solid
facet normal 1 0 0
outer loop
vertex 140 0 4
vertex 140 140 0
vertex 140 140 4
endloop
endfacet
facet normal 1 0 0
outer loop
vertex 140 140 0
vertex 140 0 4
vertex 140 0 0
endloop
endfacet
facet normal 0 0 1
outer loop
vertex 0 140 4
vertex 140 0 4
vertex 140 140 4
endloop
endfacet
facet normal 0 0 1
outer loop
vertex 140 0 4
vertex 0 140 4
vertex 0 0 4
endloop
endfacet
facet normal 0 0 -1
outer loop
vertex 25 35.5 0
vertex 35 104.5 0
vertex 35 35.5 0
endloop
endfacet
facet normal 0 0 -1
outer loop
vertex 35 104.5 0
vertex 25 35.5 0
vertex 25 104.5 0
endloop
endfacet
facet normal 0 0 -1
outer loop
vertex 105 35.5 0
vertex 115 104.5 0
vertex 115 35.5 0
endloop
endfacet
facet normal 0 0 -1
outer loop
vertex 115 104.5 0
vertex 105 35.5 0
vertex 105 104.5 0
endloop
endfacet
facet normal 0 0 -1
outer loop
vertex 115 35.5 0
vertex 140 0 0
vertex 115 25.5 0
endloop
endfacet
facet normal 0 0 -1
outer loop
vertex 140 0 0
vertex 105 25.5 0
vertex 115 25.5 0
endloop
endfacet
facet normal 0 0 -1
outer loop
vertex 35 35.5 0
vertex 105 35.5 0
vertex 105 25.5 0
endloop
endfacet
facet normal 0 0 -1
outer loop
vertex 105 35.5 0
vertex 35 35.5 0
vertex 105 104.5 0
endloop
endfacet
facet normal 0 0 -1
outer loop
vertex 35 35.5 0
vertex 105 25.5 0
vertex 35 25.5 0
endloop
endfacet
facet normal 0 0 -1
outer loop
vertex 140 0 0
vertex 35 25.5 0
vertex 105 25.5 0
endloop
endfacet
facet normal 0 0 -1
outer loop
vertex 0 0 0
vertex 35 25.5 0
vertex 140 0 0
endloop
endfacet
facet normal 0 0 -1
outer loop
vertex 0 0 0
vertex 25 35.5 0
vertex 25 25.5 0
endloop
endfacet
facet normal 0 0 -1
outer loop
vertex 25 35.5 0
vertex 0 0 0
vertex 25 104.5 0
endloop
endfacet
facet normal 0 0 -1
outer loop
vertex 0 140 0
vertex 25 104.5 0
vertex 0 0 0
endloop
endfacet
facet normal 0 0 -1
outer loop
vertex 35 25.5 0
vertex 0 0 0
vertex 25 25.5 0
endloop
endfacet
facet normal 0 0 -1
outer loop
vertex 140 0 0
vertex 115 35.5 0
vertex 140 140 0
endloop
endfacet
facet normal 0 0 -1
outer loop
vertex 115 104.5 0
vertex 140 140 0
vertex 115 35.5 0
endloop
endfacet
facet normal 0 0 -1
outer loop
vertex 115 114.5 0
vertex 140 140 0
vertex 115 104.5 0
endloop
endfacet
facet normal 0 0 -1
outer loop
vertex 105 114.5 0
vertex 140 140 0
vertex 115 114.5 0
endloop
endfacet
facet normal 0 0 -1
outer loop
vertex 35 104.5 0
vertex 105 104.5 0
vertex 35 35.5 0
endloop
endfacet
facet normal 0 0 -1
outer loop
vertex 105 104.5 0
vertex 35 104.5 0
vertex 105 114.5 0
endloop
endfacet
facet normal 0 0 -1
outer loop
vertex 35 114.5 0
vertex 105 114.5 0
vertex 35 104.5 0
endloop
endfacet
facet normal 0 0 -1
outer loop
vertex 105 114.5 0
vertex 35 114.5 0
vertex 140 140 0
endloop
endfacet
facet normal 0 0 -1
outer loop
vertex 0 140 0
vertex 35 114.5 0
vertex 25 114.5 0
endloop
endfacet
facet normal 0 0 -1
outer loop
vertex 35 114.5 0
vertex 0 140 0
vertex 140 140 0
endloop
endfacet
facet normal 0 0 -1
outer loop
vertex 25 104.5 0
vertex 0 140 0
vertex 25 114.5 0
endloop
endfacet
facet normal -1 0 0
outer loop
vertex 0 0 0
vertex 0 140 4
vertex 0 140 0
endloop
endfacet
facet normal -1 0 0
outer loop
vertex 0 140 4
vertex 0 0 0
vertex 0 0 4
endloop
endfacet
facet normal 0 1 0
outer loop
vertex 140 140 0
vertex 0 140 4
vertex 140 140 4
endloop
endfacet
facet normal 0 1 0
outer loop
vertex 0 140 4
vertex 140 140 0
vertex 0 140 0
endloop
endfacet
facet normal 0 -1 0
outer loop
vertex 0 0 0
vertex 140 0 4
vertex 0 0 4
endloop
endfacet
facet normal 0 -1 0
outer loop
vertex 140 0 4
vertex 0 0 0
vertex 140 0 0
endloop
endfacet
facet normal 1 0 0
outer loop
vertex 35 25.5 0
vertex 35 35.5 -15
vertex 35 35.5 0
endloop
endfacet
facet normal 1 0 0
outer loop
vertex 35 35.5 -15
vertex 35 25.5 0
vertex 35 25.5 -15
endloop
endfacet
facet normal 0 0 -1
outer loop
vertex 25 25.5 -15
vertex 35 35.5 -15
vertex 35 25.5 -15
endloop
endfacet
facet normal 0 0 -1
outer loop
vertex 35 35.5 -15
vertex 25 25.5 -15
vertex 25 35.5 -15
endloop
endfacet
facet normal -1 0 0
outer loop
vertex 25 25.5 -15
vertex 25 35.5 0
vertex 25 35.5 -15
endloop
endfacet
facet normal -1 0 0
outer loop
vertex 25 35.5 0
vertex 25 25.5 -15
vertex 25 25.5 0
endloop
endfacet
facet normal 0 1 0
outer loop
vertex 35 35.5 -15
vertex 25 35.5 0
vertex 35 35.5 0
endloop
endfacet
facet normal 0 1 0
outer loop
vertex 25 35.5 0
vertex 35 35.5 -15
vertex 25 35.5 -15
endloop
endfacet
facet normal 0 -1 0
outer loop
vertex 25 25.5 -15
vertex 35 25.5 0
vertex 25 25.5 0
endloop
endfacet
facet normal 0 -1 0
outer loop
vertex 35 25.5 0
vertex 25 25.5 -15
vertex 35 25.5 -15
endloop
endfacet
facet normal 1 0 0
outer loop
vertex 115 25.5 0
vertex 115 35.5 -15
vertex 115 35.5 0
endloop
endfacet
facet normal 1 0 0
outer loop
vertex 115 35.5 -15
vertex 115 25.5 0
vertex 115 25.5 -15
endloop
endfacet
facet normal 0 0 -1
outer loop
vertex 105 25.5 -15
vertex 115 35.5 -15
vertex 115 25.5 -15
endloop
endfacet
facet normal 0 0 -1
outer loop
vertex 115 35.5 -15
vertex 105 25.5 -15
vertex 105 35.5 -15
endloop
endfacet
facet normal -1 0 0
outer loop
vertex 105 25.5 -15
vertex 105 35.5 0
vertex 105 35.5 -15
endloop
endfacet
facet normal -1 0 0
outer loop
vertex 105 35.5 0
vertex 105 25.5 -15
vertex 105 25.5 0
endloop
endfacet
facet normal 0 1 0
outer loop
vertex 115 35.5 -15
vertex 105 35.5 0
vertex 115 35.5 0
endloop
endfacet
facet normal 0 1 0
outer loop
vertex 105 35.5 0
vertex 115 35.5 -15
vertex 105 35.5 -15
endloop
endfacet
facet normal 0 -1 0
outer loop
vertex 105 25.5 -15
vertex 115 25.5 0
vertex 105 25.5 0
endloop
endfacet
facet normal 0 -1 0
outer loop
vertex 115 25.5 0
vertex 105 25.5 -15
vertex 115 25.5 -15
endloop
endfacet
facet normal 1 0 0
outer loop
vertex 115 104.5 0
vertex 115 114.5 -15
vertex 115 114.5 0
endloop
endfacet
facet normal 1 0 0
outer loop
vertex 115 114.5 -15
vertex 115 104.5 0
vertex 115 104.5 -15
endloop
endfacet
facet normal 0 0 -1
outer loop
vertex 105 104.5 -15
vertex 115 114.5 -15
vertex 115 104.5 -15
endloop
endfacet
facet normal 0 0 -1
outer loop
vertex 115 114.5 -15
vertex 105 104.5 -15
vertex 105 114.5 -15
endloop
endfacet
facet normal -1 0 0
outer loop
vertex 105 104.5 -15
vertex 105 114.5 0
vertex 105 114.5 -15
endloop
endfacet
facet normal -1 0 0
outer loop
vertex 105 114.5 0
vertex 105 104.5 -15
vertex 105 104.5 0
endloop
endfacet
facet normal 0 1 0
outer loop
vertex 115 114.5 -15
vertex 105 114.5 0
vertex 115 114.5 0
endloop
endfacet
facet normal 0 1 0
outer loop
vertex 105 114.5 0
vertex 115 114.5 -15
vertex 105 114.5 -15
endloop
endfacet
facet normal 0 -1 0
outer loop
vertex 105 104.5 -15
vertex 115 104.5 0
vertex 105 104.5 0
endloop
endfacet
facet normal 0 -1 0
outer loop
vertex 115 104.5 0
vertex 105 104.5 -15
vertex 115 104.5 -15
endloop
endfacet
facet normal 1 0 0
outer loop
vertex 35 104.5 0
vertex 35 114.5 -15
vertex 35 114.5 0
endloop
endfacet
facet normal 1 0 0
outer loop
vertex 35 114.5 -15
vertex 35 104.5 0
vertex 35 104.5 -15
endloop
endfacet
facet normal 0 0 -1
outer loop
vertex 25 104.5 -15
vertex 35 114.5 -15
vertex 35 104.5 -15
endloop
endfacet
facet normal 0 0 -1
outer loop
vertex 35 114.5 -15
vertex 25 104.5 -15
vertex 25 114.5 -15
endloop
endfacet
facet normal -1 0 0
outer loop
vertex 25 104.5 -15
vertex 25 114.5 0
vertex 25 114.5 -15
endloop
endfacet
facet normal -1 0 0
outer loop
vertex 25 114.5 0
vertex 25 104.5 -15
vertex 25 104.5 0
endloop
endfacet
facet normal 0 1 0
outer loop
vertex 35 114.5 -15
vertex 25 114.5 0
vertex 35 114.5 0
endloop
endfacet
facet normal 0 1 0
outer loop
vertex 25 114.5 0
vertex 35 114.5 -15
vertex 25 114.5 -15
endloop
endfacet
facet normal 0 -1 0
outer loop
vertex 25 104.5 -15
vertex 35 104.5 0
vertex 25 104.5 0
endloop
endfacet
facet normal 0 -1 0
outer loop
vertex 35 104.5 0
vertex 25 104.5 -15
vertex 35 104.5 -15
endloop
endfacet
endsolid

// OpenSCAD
$fn = 100;
board_size = 140;

battery_out = [90,69,15];

        cube([board_size,board_size,4]);


module solar_solder_hole(){
    translate([27.5+x_board_diff,33.5+y_board_diff,16]) cylinder(r=2.5,h=3);
    translate([37.5+x_board_diff,33.5+y_board_diff,16]) cylinder(r=2.5,h=3);    
}

    
    



module screwhole(){
    screw_hole = [10,10,20];
    difference() {
        translate([25,25.5,-13]) color("DarkSlateBlue") cube([10,10,17]);
        just_screw_hole();
    }
    
} 

module just_screw_hole(){
    color("blue") translate([((board_size-battery_out[0])/2+5),((board_size-battery_out[1])/2-5),-18])  cylinder(r=1.75,h=30);   
}

module bigger_screw_hole(){
    color("blue") translate([((board_size-battery_out[0])/2+5),((board_size-battery_out[1])/2-5),-18])  cylinder(r=5,h=30);   
}

module screwhole(){
    screw_hole = [10,10,20];
    difference() {
        translate([25,25.5,-15]) color("DarkSlateBlue") cube([10,10,19]);
//        just_screw_hole();
    }
    
} 


screwhole();
translate([80,0,0]) screwhole();
translate([80,79,0]) screwhole();
translate([0,79,0]) screwhole();
